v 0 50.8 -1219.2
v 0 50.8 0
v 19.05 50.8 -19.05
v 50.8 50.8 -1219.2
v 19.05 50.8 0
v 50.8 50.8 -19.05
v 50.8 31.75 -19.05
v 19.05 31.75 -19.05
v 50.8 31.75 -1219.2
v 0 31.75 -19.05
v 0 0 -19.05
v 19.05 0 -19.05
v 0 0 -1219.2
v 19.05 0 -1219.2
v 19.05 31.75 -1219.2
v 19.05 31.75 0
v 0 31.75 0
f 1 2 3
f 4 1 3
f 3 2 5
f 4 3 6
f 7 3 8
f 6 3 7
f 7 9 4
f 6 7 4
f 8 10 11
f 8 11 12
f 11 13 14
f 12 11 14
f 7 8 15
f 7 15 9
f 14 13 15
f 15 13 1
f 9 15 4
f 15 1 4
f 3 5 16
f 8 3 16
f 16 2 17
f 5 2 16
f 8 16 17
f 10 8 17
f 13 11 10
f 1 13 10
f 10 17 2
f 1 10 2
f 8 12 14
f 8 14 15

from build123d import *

# Parameters (mm, degrees)
F0_W     = 50.8
F0_H     = 50.8
F1_DEPTH = 1219.2
F3_DEPTH = 19.05
F4_W     = 31.75
F4_H     = 31.75
F5_DEPTH = 1200.151


with BuildPart() as f1:
    # F0 (on Top) → F1 (new body)
    with BuildSketch(Plane.XY):
        with Locations((25.4, 25.4)):
            Rectangle(F0_W, F0_H)
    extrude(amount=-F1_DEPTH)

    # F2 (on face) → F3 (cut)
    with BuildSketch(Plane.XY):
        Polygon((19.05, 31.75), (0, 31.75), (0, 0), (50.8, 0), (50.8, 50.8), (19.05, 50.8), align=None)
    extrude(amount=-F3_DEPTH, mode=Mode.SUBTRACT)

    # F4 (on face) → F5 (cut, through all)
    with BuildSketch(Plane.XY.offset(-19.05)):
        with Locations((34.925, 15.875)):
            Rectangle(F4_W, F4_H)
    extrude(amount=-F5_DEPTH, mode=Mode.SUBTRACT)


solid = f1.part
